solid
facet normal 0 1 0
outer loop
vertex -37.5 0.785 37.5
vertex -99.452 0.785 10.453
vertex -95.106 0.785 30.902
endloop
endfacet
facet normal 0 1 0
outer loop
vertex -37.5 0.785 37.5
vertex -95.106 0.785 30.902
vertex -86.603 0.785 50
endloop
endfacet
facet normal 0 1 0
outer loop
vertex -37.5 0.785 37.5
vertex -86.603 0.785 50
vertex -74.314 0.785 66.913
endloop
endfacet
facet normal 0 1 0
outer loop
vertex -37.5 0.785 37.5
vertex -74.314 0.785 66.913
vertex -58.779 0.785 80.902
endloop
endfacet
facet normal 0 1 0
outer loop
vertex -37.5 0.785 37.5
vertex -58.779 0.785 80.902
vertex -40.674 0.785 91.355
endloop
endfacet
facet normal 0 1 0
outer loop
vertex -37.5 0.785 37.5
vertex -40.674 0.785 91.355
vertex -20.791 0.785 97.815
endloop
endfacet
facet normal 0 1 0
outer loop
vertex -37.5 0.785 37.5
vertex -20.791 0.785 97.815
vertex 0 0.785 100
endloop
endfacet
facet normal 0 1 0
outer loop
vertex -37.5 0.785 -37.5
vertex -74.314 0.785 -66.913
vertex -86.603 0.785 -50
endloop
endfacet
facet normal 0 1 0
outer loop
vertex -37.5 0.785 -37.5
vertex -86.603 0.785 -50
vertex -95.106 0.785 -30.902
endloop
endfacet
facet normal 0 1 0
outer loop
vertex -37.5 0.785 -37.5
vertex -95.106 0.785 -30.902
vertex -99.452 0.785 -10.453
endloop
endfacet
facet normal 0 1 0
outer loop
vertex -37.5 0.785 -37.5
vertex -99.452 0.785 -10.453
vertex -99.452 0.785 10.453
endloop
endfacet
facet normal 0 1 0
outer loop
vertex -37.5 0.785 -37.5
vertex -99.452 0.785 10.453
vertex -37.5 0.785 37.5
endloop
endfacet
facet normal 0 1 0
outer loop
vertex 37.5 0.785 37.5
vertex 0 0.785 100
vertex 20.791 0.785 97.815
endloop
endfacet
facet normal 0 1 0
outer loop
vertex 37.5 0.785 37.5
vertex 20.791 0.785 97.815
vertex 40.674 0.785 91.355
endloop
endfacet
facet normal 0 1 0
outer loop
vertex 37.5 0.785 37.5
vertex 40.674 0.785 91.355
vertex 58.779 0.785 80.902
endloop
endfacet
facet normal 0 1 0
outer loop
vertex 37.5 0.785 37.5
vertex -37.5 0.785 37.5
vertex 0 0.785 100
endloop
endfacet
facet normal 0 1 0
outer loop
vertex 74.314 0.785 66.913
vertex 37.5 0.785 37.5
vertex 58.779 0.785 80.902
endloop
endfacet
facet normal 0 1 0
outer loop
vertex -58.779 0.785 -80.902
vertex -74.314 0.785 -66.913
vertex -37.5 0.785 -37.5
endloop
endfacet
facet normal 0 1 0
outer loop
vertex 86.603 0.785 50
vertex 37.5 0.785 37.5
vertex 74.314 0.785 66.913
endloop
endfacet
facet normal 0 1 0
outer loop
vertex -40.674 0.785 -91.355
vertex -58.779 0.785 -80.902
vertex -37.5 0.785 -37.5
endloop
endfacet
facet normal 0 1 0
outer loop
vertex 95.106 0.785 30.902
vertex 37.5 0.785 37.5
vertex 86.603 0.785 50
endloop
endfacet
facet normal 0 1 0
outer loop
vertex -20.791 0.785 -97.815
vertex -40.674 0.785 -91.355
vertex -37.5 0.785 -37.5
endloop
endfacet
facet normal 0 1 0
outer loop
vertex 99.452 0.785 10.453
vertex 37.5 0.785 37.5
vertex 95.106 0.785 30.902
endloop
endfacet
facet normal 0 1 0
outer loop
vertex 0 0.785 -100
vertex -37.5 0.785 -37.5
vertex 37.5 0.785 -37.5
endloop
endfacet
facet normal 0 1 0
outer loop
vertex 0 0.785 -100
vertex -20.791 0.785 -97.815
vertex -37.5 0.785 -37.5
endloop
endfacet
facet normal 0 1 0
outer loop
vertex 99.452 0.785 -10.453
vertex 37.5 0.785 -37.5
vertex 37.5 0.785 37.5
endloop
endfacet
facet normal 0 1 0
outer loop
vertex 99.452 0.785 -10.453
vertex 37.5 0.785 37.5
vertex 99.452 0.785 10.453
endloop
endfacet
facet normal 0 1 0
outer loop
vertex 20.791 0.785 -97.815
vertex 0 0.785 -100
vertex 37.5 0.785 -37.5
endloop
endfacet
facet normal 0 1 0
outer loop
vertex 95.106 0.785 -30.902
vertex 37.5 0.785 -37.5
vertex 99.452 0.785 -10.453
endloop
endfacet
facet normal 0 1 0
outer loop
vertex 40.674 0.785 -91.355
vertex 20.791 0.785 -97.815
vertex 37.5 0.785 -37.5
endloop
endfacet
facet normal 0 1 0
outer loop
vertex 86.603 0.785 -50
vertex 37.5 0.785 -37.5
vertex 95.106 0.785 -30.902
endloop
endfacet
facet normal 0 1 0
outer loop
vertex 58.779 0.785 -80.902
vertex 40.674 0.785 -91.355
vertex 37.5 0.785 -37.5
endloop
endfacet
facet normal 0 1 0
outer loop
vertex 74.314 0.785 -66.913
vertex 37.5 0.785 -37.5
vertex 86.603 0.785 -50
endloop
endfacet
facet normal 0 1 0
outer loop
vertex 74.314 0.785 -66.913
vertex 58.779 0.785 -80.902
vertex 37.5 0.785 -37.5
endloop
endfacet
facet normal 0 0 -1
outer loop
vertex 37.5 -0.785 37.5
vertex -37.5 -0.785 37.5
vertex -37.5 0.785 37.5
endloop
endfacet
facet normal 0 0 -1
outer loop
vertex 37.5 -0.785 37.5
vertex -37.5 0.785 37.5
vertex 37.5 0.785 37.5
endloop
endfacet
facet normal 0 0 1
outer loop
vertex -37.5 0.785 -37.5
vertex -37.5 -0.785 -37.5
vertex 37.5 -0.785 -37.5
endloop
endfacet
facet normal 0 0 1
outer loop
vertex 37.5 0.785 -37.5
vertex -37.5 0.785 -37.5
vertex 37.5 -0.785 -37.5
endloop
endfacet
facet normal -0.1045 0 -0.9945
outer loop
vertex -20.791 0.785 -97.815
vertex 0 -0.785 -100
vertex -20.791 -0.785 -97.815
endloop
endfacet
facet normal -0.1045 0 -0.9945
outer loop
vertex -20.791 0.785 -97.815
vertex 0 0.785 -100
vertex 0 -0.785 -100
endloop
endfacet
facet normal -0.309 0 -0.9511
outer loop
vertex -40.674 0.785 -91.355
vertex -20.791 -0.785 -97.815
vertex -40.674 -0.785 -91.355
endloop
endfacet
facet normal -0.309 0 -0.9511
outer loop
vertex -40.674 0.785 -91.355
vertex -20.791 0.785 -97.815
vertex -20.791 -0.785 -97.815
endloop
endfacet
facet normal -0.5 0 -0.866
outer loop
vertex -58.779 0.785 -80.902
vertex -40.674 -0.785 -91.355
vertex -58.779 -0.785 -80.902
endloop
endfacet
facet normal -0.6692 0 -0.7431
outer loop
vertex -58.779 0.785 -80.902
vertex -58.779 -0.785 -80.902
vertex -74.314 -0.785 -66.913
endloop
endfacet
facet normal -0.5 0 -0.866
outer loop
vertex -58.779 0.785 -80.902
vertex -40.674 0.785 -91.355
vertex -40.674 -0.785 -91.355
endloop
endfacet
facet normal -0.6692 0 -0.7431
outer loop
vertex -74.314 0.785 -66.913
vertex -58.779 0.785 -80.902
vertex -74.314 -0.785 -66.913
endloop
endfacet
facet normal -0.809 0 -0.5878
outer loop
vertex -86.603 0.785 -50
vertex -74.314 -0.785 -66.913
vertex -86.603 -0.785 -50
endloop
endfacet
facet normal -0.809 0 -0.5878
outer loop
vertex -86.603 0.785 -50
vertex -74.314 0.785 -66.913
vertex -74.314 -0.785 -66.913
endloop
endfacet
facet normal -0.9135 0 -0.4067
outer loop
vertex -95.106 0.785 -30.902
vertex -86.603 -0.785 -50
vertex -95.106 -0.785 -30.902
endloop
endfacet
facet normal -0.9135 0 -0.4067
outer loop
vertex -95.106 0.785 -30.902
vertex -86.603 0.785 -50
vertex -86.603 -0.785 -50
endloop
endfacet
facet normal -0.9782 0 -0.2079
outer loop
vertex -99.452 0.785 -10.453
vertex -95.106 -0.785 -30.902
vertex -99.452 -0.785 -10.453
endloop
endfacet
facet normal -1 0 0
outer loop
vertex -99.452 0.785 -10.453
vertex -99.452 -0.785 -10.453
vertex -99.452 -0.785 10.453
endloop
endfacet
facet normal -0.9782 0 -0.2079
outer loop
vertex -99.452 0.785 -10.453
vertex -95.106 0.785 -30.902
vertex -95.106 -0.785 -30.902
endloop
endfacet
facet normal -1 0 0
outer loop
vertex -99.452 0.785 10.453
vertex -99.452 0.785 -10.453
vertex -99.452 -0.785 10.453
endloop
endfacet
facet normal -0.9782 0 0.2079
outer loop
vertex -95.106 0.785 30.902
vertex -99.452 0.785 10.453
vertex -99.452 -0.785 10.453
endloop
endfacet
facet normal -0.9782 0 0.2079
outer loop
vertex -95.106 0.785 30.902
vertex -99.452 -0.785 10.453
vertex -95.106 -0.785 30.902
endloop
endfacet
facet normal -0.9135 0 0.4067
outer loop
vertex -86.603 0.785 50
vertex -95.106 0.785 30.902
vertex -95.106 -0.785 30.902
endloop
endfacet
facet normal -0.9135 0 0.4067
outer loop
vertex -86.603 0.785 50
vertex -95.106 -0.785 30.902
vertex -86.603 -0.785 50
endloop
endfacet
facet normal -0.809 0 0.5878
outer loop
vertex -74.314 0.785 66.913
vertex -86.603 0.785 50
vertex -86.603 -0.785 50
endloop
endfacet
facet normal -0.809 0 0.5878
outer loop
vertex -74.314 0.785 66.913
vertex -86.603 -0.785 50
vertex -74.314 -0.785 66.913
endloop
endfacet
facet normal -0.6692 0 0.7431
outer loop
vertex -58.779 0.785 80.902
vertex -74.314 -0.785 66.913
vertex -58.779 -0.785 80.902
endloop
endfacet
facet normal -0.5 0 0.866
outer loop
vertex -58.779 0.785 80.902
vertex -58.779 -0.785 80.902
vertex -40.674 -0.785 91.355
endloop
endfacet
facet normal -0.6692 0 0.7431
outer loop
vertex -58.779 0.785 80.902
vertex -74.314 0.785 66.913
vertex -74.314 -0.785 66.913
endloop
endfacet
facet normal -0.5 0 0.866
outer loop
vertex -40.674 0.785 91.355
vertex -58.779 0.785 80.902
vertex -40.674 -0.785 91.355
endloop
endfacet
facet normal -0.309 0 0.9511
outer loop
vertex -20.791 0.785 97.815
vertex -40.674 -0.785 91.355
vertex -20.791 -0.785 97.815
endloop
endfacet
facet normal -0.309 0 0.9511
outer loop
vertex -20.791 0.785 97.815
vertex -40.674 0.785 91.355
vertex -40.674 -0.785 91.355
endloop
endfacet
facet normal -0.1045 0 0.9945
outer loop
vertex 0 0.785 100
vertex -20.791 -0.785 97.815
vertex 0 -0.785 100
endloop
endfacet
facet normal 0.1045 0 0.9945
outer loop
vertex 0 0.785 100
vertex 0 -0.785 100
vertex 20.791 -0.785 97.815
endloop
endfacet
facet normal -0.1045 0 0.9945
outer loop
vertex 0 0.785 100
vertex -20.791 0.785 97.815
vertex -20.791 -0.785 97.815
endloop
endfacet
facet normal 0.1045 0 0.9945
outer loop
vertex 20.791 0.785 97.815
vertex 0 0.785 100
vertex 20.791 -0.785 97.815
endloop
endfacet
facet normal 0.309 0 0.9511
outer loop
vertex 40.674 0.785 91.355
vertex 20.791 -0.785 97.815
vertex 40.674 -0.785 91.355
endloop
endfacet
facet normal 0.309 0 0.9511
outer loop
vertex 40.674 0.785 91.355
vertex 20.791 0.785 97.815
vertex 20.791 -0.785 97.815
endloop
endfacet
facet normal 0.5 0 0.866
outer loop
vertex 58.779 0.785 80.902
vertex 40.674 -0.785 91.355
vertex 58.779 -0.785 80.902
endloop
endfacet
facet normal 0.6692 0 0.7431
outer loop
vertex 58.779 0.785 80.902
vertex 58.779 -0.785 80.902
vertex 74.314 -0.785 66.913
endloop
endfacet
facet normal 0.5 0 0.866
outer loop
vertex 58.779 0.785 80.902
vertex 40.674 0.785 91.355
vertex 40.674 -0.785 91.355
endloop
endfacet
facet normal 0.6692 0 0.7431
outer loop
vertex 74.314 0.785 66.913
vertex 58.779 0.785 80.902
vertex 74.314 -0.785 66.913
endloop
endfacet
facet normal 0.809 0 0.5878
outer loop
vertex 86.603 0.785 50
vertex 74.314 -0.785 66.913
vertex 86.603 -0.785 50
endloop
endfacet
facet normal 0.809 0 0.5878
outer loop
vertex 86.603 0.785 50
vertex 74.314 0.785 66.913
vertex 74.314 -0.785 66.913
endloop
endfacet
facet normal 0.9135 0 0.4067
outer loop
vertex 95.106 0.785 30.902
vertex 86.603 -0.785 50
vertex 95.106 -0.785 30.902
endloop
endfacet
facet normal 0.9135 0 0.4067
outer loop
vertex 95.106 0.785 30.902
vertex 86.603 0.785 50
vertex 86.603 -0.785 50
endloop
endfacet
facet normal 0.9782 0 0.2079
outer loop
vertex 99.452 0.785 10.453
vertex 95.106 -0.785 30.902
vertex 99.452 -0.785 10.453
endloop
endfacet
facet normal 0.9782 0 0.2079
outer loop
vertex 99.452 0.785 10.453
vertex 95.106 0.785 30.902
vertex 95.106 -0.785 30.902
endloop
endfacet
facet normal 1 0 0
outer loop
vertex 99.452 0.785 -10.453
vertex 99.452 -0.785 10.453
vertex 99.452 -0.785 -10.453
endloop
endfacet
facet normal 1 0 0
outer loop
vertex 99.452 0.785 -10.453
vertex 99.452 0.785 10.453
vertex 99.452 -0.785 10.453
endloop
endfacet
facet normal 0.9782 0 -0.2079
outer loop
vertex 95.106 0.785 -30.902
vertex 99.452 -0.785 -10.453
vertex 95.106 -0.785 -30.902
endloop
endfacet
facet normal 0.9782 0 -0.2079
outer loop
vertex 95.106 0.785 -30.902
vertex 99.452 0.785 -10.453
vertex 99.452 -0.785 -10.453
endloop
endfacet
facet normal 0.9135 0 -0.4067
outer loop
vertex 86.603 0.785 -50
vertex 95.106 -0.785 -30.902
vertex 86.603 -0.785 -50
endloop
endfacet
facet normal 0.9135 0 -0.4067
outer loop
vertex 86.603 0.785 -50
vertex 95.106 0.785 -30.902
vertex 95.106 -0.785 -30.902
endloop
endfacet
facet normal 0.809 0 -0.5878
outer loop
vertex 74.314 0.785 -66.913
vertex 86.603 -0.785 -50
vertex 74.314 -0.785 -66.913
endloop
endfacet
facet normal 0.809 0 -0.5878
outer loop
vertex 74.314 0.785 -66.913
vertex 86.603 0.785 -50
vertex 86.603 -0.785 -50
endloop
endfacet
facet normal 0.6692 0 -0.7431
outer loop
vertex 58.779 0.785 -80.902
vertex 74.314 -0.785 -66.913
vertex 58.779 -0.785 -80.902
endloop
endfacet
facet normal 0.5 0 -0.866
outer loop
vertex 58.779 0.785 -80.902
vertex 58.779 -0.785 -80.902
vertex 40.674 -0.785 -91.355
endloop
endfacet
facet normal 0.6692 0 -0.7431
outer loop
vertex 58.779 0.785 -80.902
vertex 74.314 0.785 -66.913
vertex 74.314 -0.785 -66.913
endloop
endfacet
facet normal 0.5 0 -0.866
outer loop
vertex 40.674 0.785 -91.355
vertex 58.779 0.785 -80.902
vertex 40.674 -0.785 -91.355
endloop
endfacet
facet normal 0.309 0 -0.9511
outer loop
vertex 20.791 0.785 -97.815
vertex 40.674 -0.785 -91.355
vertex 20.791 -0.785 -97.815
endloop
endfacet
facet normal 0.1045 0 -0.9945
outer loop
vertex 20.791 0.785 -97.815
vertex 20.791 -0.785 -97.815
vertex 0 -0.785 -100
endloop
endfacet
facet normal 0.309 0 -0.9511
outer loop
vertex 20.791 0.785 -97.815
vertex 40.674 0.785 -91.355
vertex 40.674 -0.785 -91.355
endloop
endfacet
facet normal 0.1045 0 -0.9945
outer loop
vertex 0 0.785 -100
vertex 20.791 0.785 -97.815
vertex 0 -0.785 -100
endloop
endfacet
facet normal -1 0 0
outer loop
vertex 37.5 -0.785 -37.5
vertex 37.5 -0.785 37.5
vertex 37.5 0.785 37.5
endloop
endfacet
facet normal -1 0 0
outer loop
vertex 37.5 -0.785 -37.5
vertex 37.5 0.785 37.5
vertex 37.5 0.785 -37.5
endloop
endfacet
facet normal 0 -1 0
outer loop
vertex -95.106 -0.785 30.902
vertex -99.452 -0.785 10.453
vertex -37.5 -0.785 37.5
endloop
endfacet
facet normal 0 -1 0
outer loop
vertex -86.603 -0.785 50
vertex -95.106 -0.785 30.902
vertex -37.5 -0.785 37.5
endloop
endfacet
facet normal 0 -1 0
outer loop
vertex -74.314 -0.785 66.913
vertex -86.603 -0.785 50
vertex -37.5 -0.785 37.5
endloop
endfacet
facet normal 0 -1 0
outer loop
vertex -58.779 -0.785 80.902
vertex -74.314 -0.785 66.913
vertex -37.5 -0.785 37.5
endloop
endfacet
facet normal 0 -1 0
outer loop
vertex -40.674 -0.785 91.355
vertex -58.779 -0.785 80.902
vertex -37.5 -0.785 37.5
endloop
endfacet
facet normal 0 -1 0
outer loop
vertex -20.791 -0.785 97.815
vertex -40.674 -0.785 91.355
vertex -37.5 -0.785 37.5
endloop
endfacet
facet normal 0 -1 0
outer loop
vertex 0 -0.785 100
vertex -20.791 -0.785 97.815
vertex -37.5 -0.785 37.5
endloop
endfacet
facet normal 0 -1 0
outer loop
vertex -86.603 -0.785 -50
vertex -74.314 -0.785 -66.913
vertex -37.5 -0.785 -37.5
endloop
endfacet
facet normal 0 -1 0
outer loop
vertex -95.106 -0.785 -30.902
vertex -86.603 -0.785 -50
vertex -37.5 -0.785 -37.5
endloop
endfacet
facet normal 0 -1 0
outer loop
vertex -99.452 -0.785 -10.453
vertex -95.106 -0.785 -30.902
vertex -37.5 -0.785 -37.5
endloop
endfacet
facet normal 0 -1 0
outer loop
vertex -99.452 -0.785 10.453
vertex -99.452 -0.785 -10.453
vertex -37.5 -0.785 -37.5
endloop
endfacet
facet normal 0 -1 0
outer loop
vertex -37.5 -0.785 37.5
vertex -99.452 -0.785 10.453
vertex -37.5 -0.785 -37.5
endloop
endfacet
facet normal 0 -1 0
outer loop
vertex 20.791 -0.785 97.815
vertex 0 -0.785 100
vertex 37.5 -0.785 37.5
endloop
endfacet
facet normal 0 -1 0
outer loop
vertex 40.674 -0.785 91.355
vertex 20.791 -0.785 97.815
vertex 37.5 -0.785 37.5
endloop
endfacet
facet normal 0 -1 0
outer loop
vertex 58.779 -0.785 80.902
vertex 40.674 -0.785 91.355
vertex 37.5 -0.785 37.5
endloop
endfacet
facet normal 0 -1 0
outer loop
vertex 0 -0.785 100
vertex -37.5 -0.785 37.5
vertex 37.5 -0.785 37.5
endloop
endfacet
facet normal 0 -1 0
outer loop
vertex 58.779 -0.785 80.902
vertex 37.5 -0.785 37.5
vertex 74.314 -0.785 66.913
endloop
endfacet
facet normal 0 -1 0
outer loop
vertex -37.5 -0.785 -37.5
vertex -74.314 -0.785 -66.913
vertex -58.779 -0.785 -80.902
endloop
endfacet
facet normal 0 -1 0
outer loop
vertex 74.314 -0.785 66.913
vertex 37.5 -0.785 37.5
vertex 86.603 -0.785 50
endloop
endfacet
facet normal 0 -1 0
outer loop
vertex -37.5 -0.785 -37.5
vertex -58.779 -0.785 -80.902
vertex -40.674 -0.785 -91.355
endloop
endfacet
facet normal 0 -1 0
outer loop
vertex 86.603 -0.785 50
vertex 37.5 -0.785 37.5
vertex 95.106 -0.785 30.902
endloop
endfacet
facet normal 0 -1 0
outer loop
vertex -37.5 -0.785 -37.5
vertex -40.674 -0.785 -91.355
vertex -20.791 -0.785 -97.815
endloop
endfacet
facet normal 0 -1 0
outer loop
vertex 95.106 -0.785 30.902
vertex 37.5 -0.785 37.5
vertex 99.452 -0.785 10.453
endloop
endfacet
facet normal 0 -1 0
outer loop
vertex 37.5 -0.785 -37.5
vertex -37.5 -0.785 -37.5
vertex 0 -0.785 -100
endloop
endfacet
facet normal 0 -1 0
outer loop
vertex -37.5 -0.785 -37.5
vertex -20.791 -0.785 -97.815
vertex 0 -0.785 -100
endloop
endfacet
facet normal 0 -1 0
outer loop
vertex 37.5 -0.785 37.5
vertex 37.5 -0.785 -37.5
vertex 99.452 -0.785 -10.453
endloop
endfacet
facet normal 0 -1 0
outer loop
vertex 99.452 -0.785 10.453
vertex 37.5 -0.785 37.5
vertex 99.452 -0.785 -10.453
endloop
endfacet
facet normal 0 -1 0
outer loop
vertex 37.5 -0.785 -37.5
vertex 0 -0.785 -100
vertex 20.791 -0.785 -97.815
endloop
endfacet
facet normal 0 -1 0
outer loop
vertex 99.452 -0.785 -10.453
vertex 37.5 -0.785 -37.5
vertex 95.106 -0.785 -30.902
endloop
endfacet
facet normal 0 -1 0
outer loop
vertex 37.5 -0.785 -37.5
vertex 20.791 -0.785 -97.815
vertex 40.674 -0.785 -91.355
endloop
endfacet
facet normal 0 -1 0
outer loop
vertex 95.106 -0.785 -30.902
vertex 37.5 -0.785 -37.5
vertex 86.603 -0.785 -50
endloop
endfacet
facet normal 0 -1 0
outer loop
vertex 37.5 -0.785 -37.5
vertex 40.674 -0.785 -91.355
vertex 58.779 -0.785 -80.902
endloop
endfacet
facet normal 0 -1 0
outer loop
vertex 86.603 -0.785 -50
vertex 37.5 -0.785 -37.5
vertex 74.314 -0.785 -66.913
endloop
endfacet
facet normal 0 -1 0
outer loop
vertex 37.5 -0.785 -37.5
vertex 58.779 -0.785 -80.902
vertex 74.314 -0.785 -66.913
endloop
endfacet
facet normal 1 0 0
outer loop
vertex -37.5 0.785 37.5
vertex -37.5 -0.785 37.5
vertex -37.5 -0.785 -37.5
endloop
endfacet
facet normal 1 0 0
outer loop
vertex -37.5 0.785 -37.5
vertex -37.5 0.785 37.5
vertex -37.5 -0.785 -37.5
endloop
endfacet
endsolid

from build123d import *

# Parameters (mm, degrees)
SKETCH1_W           = 40
SKETCH1_H           = 1.57
BOSS_EXTRUDE1_START = -1.57
SKETCH2_R           = 60
SKETCH2_W           = 75
SKETCH2_H           = 75
BOSS_EXTRUDE1_DEPTH = 1.57


with BuildPart() as part:
    # Sketch1 → Revolve1 (revolve)
    with BuildSketch(Plane.XY, mode=Mode.PRIVATE) as revolve1_sk:
        with Locations((-80, 0)):
            Rectangle(SKETCH1_W, SKETCH1_H)
    revolve(revolve1_sk.sketch.rotate(Axis((0, -200069.047495165, 0), (0, 1, 0)), 270), axis=Axis((0, -200069.047495165, 0), (0, 1, 0)))

    # Sketch2 → Boss-Extrude1 (add)
    with BuildSketch(Plane(origin=(0, 0.785, 0), x_dir=(1, 0, 0), z_dir=(0, 1, 0)).offset(BOSS_EXTRUDE1_START)):
        Circle(SKETCH2_R)
        Rectangle(SKETCH2_W, SKETCH2_H, mode=Mode.SUBTRACT)
    extrude(amount=BOSS_EXTRUDE1_DEPTH)


solid = part.part
